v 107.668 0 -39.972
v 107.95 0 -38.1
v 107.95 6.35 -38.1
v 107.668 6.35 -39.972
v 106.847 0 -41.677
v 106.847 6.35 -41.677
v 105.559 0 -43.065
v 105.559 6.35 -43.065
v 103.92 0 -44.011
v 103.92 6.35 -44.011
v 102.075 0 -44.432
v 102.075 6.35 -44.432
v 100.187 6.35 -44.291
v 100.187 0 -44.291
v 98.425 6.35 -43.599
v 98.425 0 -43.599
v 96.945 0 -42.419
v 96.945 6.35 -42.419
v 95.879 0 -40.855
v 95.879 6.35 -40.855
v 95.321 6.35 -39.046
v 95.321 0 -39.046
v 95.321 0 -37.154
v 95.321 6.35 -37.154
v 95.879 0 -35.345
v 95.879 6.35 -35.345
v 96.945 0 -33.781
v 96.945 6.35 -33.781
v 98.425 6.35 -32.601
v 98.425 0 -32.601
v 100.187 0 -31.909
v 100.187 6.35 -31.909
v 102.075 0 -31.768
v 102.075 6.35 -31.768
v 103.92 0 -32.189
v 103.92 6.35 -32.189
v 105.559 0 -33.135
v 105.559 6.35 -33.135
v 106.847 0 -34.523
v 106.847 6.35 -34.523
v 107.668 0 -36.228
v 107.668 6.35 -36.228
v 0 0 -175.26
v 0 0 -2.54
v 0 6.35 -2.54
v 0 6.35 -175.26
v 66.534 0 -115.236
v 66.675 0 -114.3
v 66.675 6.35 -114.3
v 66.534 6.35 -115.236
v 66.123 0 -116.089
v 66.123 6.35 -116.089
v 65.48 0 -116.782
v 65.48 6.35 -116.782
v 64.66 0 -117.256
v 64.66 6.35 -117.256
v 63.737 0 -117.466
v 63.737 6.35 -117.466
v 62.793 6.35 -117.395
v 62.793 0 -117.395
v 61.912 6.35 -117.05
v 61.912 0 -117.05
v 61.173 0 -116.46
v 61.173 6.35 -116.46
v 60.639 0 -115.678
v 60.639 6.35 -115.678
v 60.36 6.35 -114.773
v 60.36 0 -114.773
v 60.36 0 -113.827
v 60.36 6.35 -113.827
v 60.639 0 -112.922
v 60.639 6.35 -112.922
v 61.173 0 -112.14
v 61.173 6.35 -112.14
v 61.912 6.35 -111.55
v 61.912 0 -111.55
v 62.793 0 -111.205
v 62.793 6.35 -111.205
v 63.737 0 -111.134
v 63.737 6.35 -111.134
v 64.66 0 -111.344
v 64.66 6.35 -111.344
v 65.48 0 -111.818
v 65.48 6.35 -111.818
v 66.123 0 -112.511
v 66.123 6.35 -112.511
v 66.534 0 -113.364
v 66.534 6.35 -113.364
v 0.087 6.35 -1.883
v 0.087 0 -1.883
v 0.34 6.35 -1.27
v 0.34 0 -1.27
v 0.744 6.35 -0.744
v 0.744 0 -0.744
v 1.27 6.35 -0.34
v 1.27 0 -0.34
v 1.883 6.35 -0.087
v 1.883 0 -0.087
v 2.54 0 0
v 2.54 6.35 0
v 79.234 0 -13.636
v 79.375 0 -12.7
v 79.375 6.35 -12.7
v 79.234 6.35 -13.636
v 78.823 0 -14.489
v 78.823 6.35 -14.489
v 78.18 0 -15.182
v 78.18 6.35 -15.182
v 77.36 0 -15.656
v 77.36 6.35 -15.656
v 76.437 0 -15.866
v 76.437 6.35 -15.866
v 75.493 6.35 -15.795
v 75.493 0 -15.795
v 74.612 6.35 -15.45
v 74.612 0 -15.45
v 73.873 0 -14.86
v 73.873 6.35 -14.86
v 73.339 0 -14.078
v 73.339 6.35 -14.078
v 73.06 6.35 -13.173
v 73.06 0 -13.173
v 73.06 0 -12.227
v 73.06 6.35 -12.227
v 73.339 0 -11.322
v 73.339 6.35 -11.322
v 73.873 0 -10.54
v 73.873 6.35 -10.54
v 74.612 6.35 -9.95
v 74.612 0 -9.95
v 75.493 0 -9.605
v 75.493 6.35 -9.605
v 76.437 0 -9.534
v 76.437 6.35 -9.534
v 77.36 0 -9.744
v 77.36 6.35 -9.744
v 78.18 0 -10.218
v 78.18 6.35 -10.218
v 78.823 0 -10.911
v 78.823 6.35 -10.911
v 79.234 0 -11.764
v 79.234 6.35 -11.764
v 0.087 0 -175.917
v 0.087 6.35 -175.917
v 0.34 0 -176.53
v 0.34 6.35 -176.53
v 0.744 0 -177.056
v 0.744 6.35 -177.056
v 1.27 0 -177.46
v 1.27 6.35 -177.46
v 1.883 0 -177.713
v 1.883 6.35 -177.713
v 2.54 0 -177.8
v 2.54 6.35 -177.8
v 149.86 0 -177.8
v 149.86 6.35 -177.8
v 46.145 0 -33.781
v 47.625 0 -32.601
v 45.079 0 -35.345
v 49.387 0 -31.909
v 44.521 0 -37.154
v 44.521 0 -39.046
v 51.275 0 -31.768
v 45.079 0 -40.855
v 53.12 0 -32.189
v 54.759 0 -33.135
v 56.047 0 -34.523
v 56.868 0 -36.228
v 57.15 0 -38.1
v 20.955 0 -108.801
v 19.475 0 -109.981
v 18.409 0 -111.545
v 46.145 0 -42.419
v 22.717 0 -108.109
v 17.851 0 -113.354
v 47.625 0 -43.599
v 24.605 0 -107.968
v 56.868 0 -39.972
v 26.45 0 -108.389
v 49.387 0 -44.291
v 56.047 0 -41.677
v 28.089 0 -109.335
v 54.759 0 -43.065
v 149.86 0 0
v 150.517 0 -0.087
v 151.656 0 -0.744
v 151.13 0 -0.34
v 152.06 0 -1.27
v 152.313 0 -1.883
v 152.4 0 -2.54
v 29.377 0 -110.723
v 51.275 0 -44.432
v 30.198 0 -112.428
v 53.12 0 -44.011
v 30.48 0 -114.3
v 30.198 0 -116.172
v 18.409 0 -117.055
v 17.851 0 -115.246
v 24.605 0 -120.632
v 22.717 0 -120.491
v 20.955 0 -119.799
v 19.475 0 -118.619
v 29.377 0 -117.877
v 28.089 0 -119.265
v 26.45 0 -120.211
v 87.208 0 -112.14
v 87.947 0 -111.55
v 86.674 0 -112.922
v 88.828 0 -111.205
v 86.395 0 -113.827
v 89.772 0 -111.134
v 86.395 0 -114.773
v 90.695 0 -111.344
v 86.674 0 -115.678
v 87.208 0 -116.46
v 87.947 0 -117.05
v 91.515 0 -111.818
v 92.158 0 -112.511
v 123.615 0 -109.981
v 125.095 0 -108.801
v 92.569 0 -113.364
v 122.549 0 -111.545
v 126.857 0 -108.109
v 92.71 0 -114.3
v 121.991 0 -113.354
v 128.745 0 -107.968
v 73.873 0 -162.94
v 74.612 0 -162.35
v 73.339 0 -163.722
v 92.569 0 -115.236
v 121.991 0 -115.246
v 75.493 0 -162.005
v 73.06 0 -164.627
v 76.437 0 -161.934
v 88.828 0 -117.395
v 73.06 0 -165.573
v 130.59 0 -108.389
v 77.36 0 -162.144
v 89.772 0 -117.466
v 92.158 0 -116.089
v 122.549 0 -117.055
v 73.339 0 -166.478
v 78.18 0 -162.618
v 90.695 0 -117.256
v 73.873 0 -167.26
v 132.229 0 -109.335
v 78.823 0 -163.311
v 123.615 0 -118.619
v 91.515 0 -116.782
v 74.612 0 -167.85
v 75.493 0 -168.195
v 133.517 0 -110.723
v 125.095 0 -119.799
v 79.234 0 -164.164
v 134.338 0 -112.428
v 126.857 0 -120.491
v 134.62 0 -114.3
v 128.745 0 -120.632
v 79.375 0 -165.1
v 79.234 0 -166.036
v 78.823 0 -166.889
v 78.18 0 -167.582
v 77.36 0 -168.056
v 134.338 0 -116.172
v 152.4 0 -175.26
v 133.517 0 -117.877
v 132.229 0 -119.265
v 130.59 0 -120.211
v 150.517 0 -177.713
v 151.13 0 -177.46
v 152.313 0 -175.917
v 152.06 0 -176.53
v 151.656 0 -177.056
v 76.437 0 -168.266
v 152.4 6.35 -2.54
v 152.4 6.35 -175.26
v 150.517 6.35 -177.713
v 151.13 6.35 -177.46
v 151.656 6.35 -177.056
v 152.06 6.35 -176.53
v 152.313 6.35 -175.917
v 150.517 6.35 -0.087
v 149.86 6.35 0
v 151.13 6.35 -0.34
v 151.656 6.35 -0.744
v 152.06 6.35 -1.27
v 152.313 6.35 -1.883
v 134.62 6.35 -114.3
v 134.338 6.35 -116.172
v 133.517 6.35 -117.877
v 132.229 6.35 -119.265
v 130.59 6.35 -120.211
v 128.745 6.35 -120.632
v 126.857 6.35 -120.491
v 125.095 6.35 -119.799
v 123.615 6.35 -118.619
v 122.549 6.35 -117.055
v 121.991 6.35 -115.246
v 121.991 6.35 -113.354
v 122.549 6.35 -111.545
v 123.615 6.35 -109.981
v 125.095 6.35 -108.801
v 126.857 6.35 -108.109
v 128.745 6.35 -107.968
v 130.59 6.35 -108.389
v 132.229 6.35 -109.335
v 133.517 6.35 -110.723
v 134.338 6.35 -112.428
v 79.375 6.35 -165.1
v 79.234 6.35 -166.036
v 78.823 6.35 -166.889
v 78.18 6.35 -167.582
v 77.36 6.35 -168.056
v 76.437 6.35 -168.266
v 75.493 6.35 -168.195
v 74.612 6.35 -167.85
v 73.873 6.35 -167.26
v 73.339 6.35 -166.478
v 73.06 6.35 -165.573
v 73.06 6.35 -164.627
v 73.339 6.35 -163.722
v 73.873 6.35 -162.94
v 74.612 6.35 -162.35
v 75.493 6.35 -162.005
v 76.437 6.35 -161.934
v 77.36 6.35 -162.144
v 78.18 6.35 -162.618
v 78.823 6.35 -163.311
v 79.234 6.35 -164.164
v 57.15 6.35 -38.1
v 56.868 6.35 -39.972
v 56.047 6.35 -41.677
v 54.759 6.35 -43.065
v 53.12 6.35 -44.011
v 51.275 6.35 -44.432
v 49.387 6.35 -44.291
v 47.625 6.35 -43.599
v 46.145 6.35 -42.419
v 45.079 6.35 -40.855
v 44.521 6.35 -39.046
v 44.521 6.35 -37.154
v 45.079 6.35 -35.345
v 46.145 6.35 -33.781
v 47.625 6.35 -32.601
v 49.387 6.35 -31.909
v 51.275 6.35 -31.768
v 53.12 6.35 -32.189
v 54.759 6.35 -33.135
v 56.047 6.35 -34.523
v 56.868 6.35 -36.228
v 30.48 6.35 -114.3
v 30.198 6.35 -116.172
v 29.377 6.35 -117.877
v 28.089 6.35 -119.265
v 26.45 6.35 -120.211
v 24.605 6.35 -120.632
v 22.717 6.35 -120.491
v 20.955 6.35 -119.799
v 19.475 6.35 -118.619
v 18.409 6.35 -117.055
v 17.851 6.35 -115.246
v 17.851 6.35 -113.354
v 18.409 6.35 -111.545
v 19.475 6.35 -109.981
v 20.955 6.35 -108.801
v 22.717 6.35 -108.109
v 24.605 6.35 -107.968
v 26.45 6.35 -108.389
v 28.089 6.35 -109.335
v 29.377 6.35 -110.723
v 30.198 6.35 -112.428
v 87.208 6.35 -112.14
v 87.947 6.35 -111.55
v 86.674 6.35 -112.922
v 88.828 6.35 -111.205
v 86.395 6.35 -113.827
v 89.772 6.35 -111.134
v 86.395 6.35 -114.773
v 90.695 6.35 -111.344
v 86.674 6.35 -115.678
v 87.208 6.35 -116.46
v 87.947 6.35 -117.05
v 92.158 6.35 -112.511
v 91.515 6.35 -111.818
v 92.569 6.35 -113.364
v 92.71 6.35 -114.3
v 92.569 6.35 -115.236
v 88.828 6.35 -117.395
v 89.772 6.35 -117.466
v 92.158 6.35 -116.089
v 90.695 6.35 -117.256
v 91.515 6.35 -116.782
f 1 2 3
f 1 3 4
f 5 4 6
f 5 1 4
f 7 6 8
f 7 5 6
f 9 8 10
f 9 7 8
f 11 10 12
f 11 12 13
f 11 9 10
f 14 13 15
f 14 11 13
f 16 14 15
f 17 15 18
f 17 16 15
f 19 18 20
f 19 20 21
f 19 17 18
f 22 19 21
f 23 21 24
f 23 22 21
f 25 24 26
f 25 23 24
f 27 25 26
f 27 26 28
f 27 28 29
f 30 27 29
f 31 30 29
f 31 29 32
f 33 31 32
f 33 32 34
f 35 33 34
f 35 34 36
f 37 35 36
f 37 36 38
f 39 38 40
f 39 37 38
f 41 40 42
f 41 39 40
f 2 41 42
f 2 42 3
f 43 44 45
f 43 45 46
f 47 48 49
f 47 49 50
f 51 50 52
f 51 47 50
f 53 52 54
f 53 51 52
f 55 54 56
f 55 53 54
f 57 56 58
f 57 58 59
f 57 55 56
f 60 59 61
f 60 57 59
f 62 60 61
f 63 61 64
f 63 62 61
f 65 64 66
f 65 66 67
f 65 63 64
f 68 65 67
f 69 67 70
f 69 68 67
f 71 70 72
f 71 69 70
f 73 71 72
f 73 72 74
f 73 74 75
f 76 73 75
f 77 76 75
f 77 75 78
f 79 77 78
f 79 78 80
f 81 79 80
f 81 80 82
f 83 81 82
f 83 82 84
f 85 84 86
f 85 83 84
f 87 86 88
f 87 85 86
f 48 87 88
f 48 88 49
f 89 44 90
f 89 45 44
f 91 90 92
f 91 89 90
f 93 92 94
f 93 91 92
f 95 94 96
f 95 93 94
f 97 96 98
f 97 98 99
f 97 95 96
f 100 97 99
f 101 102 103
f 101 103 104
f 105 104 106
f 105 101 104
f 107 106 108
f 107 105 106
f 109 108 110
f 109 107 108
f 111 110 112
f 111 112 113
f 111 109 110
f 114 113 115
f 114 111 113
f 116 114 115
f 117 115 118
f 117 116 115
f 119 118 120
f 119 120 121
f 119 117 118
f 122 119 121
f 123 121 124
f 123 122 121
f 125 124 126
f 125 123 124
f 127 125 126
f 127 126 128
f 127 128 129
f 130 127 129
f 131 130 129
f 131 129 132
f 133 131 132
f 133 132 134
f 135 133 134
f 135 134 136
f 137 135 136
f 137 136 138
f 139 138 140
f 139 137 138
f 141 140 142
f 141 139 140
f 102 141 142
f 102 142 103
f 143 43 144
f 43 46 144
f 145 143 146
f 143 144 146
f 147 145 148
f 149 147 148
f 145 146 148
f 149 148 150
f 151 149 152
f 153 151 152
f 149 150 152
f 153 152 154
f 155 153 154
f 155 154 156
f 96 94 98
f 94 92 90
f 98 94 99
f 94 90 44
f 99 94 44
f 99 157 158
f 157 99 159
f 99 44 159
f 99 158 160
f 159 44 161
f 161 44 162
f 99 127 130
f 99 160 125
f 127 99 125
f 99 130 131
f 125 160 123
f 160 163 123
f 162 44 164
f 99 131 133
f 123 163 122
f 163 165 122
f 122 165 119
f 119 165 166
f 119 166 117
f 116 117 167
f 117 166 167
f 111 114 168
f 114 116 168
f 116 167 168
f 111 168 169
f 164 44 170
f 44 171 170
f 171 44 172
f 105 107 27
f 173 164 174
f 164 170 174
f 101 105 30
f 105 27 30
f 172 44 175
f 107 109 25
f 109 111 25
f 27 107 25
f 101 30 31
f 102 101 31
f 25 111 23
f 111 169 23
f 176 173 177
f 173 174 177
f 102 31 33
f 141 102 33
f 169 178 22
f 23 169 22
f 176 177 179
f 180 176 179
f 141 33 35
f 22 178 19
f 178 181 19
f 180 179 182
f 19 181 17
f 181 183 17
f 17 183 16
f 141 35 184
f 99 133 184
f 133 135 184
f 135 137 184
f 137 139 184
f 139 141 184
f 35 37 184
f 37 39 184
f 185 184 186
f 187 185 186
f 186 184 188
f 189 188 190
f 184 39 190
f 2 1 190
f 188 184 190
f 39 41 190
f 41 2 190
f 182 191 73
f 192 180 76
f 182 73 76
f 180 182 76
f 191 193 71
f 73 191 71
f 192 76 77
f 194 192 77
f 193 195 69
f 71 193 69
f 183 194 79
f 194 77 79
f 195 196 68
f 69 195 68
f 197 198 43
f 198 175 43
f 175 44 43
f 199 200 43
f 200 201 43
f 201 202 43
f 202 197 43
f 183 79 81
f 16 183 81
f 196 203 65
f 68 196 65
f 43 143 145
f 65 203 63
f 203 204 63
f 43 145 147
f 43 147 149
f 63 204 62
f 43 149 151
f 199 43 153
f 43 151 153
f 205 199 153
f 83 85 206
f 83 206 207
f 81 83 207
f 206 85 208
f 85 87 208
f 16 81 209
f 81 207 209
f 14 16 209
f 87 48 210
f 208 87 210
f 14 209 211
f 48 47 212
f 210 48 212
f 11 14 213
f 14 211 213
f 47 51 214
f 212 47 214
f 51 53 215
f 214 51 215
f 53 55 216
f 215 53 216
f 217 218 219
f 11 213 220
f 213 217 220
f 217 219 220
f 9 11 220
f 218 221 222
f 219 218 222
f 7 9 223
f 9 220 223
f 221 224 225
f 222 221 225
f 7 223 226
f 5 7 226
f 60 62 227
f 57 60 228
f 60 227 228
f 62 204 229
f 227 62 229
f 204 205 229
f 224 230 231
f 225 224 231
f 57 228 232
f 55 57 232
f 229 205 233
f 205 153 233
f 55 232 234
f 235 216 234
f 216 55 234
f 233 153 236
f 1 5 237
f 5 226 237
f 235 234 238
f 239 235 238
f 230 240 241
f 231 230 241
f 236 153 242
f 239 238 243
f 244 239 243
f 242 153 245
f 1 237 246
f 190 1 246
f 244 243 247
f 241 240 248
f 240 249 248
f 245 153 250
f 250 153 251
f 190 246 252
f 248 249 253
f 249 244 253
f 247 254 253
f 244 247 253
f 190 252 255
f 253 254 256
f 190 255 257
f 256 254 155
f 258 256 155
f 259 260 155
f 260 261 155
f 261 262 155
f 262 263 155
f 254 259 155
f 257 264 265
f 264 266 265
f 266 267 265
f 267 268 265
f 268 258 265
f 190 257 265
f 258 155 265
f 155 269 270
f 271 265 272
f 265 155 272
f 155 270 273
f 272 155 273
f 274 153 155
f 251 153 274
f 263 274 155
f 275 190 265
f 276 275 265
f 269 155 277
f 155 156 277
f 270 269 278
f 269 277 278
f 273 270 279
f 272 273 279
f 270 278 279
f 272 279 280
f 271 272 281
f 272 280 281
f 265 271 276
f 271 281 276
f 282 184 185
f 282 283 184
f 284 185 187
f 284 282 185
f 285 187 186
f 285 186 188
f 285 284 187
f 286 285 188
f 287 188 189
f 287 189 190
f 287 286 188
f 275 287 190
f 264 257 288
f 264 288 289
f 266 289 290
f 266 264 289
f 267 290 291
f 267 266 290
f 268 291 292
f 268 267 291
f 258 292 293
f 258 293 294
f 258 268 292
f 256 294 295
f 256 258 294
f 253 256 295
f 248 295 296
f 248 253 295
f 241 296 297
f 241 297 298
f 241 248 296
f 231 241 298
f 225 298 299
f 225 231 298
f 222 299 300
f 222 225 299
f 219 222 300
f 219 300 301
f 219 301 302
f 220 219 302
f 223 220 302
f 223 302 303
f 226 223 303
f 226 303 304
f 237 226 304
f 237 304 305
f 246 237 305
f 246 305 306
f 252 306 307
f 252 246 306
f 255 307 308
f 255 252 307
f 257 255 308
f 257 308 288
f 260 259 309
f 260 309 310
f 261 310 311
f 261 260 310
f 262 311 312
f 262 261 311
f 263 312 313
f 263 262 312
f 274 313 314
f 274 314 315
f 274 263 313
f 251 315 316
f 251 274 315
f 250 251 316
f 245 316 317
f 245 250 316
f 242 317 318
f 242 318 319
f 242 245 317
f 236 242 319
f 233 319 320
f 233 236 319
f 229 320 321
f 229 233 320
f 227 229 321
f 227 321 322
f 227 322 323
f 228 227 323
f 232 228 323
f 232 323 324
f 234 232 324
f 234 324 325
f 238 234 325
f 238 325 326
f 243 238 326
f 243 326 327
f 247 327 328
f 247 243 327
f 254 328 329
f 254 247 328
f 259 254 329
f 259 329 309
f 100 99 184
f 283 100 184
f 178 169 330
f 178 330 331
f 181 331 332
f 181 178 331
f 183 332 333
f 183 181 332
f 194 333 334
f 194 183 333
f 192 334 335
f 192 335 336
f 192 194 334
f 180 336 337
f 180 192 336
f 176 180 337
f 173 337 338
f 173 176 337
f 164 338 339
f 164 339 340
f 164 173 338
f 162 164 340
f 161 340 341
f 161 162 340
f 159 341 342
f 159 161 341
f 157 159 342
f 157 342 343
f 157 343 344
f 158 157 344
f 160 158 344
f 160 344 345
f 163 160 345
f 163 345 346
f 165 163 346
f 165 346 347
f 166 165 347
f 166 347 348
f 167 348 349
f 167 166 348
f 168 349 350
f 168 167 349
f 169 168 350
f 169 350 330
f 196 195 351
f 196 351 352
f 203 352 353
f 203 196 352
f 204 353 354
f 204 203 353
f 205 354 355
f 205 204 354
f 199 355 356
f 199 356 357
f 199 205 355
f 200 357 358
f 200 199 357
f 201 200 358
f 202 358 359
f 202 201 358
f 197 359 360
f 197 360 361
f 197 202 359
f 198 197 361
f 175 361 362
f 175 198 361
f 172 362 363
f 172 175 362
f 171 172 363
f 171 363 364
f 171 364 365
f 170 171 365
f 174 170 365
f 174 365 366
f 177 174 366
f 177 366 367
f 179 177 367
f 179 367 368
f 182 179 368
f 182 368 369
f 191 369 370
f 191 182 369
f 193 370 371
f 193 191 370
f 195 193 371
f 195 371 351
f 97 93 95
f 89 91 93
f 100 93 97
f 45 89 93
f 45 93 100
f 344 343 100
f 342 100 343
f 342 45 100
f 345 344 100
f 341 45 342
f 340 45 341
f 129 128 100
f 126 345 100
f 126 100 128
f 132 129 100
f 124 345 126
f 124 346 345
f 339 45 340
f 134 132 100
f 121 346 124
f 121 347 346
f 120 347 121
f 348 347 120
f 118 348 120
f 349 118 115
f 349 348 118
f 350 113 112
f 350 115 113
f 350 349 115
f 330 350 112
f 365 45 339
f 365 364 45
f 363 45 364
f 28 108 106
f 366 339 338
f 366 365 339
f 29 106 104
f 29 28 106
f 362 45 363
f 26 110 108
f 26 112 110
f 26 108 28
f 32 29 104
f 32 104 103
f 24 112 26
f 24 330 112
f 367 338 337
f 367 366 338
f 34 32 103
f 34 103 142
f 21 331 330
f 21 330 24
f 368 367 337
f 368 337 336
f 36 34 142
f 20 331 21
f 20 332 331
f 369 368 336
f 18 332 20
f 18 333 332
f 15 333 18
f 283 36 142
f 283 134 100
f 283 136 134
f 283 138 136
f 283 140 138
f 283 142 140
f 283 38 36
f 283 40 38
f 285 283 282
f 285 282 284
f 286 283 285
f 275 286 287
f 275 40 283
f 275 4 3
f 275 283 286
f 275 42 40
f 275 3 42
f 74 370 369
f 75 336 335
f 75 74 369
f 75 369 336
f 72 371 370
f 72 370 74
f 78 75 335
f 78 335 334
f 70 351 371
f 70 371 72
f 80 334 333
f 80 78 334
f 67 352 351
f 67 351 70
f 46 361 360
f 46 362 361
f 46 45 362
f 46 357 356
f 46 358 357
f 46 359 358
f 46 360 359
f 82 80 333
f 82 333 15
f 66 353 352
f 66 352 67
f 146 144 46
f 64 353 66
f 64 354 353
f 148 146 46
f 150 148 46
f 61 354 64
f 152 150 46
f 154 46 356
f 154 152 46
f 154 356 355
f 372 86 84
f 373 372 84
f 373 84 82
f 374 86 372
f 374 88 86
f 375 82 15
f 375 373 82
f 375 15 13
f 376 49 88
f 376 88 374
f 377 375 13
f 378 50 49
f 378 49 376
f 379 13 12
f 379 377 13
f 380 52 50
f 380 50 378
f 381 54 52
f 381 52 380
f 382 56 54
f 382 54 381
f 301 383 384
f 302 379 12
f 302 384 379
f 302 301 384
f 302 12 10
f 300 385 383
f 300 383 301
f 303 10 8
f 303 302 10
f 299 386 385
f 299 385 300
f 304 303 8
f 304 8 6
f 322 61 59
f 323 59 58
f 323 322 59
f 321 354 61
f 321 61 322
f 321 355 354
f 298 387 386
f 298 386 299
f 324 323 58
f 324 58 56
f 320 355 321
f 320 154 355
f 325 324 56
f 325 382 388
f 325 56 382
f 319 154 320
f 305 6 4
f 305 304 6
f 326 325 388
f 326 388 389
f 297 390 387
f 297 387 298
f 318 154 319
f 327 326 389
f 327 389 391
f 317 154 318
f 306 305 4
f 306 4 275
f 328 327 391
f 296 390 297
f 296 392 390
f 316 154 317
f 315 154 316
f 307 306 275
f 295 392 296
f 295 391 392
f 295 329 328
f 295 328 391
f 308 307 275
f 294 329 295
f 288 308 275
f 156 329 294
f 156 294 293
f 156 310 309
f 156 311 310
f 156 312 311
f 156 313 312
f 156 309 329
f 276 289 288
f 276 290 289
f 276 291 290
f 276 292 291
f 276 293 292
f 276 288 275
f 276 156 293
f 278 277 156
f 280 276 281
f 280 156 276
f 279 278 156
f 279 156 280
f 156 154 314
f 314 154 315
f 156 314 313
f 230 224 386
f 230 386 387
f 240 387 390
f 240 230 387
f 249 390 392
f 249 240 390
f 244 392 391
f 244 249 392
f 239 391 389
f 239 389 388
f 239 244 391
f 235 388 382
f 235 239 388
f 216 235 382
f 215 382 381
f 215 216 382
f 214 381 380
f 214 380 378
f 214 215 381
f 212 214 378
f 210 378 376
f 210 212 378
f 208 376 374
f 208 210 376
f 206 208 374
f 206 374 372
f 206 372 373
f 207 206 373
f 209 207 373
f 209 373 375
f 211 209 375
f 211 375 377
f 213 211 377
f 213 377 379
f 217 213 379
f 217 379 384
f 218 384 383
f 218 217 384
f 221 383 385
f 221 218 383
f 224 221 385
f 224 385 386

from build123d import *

# Parameters (mm, degrees)
SKETCH1_W           = 152.4
SKETCH1_H           = 177.8
SKETCH1_R           = 6.35
SKETCH1_R_2         = 3.175
BOSS_EXTRUDE1_DEPTH = 6.35
FILLET1_R           = 2.54


with BuildPart() as part:
    # Sketch1 → Boss-Extrude1 (new body)
    with BuildSketch(Plane(origin=(0, 0, 0), x_dir=(1, 0, 0), z_dir=(0, 1, 0))):
        with Locations((76.2, 88.9)):
            Rectangle(SKETCH1_W, SKETCH1_H)
        with Locations((24.13, 114.3)):
            Circle(SKETCH1_R, mode=Mode.SUBTRACT)
        with Locations((128.27, 114.3)):
            Circle(SKETCH1_R, mode=Mode.SUBTRACT)
        with Locations((50.8, 38.1)):
            Circle(SKETCH1_R, mode=Mode.SUBTRACT)
        with Locations((101.6, 38.1)):
            Circle(SKETCH1_R, mode=Mode.SUBTRACT)
        with Locations((76.2, 165.1)):
            Circle(SKETCH1_R_2, mode=Mode.SUBTRACT)
        with Locations((76.2, 12.7)):
            Circle(SKETCH1_R_2, mode=Mode.SUBTRACT)
        with Locations((63.5, 114.3)):
            Circle(SKETCH1_R_2, mode=Mode.SUBTRACT)
        with Locations((89.535, 114.3)):
            Circle(SKETCH1_R_2, mode=Mode.SUBTRACT)
    extrude(amount=BOSS_EXTRUDE1_DEPTH)

    # Fillet1
    fillet1_edges = [part.edges().sort_by_distance(p)[0] for p in [
        (0, 3.175, -177.8),
        (152.4, 3.175, -177.8),
        (152.4, 3.175, 0),
        (0, 3.175, 0),
    ]]
    fillet(fillet1_edges, radius=FILLET1_R)


solid = part.part
